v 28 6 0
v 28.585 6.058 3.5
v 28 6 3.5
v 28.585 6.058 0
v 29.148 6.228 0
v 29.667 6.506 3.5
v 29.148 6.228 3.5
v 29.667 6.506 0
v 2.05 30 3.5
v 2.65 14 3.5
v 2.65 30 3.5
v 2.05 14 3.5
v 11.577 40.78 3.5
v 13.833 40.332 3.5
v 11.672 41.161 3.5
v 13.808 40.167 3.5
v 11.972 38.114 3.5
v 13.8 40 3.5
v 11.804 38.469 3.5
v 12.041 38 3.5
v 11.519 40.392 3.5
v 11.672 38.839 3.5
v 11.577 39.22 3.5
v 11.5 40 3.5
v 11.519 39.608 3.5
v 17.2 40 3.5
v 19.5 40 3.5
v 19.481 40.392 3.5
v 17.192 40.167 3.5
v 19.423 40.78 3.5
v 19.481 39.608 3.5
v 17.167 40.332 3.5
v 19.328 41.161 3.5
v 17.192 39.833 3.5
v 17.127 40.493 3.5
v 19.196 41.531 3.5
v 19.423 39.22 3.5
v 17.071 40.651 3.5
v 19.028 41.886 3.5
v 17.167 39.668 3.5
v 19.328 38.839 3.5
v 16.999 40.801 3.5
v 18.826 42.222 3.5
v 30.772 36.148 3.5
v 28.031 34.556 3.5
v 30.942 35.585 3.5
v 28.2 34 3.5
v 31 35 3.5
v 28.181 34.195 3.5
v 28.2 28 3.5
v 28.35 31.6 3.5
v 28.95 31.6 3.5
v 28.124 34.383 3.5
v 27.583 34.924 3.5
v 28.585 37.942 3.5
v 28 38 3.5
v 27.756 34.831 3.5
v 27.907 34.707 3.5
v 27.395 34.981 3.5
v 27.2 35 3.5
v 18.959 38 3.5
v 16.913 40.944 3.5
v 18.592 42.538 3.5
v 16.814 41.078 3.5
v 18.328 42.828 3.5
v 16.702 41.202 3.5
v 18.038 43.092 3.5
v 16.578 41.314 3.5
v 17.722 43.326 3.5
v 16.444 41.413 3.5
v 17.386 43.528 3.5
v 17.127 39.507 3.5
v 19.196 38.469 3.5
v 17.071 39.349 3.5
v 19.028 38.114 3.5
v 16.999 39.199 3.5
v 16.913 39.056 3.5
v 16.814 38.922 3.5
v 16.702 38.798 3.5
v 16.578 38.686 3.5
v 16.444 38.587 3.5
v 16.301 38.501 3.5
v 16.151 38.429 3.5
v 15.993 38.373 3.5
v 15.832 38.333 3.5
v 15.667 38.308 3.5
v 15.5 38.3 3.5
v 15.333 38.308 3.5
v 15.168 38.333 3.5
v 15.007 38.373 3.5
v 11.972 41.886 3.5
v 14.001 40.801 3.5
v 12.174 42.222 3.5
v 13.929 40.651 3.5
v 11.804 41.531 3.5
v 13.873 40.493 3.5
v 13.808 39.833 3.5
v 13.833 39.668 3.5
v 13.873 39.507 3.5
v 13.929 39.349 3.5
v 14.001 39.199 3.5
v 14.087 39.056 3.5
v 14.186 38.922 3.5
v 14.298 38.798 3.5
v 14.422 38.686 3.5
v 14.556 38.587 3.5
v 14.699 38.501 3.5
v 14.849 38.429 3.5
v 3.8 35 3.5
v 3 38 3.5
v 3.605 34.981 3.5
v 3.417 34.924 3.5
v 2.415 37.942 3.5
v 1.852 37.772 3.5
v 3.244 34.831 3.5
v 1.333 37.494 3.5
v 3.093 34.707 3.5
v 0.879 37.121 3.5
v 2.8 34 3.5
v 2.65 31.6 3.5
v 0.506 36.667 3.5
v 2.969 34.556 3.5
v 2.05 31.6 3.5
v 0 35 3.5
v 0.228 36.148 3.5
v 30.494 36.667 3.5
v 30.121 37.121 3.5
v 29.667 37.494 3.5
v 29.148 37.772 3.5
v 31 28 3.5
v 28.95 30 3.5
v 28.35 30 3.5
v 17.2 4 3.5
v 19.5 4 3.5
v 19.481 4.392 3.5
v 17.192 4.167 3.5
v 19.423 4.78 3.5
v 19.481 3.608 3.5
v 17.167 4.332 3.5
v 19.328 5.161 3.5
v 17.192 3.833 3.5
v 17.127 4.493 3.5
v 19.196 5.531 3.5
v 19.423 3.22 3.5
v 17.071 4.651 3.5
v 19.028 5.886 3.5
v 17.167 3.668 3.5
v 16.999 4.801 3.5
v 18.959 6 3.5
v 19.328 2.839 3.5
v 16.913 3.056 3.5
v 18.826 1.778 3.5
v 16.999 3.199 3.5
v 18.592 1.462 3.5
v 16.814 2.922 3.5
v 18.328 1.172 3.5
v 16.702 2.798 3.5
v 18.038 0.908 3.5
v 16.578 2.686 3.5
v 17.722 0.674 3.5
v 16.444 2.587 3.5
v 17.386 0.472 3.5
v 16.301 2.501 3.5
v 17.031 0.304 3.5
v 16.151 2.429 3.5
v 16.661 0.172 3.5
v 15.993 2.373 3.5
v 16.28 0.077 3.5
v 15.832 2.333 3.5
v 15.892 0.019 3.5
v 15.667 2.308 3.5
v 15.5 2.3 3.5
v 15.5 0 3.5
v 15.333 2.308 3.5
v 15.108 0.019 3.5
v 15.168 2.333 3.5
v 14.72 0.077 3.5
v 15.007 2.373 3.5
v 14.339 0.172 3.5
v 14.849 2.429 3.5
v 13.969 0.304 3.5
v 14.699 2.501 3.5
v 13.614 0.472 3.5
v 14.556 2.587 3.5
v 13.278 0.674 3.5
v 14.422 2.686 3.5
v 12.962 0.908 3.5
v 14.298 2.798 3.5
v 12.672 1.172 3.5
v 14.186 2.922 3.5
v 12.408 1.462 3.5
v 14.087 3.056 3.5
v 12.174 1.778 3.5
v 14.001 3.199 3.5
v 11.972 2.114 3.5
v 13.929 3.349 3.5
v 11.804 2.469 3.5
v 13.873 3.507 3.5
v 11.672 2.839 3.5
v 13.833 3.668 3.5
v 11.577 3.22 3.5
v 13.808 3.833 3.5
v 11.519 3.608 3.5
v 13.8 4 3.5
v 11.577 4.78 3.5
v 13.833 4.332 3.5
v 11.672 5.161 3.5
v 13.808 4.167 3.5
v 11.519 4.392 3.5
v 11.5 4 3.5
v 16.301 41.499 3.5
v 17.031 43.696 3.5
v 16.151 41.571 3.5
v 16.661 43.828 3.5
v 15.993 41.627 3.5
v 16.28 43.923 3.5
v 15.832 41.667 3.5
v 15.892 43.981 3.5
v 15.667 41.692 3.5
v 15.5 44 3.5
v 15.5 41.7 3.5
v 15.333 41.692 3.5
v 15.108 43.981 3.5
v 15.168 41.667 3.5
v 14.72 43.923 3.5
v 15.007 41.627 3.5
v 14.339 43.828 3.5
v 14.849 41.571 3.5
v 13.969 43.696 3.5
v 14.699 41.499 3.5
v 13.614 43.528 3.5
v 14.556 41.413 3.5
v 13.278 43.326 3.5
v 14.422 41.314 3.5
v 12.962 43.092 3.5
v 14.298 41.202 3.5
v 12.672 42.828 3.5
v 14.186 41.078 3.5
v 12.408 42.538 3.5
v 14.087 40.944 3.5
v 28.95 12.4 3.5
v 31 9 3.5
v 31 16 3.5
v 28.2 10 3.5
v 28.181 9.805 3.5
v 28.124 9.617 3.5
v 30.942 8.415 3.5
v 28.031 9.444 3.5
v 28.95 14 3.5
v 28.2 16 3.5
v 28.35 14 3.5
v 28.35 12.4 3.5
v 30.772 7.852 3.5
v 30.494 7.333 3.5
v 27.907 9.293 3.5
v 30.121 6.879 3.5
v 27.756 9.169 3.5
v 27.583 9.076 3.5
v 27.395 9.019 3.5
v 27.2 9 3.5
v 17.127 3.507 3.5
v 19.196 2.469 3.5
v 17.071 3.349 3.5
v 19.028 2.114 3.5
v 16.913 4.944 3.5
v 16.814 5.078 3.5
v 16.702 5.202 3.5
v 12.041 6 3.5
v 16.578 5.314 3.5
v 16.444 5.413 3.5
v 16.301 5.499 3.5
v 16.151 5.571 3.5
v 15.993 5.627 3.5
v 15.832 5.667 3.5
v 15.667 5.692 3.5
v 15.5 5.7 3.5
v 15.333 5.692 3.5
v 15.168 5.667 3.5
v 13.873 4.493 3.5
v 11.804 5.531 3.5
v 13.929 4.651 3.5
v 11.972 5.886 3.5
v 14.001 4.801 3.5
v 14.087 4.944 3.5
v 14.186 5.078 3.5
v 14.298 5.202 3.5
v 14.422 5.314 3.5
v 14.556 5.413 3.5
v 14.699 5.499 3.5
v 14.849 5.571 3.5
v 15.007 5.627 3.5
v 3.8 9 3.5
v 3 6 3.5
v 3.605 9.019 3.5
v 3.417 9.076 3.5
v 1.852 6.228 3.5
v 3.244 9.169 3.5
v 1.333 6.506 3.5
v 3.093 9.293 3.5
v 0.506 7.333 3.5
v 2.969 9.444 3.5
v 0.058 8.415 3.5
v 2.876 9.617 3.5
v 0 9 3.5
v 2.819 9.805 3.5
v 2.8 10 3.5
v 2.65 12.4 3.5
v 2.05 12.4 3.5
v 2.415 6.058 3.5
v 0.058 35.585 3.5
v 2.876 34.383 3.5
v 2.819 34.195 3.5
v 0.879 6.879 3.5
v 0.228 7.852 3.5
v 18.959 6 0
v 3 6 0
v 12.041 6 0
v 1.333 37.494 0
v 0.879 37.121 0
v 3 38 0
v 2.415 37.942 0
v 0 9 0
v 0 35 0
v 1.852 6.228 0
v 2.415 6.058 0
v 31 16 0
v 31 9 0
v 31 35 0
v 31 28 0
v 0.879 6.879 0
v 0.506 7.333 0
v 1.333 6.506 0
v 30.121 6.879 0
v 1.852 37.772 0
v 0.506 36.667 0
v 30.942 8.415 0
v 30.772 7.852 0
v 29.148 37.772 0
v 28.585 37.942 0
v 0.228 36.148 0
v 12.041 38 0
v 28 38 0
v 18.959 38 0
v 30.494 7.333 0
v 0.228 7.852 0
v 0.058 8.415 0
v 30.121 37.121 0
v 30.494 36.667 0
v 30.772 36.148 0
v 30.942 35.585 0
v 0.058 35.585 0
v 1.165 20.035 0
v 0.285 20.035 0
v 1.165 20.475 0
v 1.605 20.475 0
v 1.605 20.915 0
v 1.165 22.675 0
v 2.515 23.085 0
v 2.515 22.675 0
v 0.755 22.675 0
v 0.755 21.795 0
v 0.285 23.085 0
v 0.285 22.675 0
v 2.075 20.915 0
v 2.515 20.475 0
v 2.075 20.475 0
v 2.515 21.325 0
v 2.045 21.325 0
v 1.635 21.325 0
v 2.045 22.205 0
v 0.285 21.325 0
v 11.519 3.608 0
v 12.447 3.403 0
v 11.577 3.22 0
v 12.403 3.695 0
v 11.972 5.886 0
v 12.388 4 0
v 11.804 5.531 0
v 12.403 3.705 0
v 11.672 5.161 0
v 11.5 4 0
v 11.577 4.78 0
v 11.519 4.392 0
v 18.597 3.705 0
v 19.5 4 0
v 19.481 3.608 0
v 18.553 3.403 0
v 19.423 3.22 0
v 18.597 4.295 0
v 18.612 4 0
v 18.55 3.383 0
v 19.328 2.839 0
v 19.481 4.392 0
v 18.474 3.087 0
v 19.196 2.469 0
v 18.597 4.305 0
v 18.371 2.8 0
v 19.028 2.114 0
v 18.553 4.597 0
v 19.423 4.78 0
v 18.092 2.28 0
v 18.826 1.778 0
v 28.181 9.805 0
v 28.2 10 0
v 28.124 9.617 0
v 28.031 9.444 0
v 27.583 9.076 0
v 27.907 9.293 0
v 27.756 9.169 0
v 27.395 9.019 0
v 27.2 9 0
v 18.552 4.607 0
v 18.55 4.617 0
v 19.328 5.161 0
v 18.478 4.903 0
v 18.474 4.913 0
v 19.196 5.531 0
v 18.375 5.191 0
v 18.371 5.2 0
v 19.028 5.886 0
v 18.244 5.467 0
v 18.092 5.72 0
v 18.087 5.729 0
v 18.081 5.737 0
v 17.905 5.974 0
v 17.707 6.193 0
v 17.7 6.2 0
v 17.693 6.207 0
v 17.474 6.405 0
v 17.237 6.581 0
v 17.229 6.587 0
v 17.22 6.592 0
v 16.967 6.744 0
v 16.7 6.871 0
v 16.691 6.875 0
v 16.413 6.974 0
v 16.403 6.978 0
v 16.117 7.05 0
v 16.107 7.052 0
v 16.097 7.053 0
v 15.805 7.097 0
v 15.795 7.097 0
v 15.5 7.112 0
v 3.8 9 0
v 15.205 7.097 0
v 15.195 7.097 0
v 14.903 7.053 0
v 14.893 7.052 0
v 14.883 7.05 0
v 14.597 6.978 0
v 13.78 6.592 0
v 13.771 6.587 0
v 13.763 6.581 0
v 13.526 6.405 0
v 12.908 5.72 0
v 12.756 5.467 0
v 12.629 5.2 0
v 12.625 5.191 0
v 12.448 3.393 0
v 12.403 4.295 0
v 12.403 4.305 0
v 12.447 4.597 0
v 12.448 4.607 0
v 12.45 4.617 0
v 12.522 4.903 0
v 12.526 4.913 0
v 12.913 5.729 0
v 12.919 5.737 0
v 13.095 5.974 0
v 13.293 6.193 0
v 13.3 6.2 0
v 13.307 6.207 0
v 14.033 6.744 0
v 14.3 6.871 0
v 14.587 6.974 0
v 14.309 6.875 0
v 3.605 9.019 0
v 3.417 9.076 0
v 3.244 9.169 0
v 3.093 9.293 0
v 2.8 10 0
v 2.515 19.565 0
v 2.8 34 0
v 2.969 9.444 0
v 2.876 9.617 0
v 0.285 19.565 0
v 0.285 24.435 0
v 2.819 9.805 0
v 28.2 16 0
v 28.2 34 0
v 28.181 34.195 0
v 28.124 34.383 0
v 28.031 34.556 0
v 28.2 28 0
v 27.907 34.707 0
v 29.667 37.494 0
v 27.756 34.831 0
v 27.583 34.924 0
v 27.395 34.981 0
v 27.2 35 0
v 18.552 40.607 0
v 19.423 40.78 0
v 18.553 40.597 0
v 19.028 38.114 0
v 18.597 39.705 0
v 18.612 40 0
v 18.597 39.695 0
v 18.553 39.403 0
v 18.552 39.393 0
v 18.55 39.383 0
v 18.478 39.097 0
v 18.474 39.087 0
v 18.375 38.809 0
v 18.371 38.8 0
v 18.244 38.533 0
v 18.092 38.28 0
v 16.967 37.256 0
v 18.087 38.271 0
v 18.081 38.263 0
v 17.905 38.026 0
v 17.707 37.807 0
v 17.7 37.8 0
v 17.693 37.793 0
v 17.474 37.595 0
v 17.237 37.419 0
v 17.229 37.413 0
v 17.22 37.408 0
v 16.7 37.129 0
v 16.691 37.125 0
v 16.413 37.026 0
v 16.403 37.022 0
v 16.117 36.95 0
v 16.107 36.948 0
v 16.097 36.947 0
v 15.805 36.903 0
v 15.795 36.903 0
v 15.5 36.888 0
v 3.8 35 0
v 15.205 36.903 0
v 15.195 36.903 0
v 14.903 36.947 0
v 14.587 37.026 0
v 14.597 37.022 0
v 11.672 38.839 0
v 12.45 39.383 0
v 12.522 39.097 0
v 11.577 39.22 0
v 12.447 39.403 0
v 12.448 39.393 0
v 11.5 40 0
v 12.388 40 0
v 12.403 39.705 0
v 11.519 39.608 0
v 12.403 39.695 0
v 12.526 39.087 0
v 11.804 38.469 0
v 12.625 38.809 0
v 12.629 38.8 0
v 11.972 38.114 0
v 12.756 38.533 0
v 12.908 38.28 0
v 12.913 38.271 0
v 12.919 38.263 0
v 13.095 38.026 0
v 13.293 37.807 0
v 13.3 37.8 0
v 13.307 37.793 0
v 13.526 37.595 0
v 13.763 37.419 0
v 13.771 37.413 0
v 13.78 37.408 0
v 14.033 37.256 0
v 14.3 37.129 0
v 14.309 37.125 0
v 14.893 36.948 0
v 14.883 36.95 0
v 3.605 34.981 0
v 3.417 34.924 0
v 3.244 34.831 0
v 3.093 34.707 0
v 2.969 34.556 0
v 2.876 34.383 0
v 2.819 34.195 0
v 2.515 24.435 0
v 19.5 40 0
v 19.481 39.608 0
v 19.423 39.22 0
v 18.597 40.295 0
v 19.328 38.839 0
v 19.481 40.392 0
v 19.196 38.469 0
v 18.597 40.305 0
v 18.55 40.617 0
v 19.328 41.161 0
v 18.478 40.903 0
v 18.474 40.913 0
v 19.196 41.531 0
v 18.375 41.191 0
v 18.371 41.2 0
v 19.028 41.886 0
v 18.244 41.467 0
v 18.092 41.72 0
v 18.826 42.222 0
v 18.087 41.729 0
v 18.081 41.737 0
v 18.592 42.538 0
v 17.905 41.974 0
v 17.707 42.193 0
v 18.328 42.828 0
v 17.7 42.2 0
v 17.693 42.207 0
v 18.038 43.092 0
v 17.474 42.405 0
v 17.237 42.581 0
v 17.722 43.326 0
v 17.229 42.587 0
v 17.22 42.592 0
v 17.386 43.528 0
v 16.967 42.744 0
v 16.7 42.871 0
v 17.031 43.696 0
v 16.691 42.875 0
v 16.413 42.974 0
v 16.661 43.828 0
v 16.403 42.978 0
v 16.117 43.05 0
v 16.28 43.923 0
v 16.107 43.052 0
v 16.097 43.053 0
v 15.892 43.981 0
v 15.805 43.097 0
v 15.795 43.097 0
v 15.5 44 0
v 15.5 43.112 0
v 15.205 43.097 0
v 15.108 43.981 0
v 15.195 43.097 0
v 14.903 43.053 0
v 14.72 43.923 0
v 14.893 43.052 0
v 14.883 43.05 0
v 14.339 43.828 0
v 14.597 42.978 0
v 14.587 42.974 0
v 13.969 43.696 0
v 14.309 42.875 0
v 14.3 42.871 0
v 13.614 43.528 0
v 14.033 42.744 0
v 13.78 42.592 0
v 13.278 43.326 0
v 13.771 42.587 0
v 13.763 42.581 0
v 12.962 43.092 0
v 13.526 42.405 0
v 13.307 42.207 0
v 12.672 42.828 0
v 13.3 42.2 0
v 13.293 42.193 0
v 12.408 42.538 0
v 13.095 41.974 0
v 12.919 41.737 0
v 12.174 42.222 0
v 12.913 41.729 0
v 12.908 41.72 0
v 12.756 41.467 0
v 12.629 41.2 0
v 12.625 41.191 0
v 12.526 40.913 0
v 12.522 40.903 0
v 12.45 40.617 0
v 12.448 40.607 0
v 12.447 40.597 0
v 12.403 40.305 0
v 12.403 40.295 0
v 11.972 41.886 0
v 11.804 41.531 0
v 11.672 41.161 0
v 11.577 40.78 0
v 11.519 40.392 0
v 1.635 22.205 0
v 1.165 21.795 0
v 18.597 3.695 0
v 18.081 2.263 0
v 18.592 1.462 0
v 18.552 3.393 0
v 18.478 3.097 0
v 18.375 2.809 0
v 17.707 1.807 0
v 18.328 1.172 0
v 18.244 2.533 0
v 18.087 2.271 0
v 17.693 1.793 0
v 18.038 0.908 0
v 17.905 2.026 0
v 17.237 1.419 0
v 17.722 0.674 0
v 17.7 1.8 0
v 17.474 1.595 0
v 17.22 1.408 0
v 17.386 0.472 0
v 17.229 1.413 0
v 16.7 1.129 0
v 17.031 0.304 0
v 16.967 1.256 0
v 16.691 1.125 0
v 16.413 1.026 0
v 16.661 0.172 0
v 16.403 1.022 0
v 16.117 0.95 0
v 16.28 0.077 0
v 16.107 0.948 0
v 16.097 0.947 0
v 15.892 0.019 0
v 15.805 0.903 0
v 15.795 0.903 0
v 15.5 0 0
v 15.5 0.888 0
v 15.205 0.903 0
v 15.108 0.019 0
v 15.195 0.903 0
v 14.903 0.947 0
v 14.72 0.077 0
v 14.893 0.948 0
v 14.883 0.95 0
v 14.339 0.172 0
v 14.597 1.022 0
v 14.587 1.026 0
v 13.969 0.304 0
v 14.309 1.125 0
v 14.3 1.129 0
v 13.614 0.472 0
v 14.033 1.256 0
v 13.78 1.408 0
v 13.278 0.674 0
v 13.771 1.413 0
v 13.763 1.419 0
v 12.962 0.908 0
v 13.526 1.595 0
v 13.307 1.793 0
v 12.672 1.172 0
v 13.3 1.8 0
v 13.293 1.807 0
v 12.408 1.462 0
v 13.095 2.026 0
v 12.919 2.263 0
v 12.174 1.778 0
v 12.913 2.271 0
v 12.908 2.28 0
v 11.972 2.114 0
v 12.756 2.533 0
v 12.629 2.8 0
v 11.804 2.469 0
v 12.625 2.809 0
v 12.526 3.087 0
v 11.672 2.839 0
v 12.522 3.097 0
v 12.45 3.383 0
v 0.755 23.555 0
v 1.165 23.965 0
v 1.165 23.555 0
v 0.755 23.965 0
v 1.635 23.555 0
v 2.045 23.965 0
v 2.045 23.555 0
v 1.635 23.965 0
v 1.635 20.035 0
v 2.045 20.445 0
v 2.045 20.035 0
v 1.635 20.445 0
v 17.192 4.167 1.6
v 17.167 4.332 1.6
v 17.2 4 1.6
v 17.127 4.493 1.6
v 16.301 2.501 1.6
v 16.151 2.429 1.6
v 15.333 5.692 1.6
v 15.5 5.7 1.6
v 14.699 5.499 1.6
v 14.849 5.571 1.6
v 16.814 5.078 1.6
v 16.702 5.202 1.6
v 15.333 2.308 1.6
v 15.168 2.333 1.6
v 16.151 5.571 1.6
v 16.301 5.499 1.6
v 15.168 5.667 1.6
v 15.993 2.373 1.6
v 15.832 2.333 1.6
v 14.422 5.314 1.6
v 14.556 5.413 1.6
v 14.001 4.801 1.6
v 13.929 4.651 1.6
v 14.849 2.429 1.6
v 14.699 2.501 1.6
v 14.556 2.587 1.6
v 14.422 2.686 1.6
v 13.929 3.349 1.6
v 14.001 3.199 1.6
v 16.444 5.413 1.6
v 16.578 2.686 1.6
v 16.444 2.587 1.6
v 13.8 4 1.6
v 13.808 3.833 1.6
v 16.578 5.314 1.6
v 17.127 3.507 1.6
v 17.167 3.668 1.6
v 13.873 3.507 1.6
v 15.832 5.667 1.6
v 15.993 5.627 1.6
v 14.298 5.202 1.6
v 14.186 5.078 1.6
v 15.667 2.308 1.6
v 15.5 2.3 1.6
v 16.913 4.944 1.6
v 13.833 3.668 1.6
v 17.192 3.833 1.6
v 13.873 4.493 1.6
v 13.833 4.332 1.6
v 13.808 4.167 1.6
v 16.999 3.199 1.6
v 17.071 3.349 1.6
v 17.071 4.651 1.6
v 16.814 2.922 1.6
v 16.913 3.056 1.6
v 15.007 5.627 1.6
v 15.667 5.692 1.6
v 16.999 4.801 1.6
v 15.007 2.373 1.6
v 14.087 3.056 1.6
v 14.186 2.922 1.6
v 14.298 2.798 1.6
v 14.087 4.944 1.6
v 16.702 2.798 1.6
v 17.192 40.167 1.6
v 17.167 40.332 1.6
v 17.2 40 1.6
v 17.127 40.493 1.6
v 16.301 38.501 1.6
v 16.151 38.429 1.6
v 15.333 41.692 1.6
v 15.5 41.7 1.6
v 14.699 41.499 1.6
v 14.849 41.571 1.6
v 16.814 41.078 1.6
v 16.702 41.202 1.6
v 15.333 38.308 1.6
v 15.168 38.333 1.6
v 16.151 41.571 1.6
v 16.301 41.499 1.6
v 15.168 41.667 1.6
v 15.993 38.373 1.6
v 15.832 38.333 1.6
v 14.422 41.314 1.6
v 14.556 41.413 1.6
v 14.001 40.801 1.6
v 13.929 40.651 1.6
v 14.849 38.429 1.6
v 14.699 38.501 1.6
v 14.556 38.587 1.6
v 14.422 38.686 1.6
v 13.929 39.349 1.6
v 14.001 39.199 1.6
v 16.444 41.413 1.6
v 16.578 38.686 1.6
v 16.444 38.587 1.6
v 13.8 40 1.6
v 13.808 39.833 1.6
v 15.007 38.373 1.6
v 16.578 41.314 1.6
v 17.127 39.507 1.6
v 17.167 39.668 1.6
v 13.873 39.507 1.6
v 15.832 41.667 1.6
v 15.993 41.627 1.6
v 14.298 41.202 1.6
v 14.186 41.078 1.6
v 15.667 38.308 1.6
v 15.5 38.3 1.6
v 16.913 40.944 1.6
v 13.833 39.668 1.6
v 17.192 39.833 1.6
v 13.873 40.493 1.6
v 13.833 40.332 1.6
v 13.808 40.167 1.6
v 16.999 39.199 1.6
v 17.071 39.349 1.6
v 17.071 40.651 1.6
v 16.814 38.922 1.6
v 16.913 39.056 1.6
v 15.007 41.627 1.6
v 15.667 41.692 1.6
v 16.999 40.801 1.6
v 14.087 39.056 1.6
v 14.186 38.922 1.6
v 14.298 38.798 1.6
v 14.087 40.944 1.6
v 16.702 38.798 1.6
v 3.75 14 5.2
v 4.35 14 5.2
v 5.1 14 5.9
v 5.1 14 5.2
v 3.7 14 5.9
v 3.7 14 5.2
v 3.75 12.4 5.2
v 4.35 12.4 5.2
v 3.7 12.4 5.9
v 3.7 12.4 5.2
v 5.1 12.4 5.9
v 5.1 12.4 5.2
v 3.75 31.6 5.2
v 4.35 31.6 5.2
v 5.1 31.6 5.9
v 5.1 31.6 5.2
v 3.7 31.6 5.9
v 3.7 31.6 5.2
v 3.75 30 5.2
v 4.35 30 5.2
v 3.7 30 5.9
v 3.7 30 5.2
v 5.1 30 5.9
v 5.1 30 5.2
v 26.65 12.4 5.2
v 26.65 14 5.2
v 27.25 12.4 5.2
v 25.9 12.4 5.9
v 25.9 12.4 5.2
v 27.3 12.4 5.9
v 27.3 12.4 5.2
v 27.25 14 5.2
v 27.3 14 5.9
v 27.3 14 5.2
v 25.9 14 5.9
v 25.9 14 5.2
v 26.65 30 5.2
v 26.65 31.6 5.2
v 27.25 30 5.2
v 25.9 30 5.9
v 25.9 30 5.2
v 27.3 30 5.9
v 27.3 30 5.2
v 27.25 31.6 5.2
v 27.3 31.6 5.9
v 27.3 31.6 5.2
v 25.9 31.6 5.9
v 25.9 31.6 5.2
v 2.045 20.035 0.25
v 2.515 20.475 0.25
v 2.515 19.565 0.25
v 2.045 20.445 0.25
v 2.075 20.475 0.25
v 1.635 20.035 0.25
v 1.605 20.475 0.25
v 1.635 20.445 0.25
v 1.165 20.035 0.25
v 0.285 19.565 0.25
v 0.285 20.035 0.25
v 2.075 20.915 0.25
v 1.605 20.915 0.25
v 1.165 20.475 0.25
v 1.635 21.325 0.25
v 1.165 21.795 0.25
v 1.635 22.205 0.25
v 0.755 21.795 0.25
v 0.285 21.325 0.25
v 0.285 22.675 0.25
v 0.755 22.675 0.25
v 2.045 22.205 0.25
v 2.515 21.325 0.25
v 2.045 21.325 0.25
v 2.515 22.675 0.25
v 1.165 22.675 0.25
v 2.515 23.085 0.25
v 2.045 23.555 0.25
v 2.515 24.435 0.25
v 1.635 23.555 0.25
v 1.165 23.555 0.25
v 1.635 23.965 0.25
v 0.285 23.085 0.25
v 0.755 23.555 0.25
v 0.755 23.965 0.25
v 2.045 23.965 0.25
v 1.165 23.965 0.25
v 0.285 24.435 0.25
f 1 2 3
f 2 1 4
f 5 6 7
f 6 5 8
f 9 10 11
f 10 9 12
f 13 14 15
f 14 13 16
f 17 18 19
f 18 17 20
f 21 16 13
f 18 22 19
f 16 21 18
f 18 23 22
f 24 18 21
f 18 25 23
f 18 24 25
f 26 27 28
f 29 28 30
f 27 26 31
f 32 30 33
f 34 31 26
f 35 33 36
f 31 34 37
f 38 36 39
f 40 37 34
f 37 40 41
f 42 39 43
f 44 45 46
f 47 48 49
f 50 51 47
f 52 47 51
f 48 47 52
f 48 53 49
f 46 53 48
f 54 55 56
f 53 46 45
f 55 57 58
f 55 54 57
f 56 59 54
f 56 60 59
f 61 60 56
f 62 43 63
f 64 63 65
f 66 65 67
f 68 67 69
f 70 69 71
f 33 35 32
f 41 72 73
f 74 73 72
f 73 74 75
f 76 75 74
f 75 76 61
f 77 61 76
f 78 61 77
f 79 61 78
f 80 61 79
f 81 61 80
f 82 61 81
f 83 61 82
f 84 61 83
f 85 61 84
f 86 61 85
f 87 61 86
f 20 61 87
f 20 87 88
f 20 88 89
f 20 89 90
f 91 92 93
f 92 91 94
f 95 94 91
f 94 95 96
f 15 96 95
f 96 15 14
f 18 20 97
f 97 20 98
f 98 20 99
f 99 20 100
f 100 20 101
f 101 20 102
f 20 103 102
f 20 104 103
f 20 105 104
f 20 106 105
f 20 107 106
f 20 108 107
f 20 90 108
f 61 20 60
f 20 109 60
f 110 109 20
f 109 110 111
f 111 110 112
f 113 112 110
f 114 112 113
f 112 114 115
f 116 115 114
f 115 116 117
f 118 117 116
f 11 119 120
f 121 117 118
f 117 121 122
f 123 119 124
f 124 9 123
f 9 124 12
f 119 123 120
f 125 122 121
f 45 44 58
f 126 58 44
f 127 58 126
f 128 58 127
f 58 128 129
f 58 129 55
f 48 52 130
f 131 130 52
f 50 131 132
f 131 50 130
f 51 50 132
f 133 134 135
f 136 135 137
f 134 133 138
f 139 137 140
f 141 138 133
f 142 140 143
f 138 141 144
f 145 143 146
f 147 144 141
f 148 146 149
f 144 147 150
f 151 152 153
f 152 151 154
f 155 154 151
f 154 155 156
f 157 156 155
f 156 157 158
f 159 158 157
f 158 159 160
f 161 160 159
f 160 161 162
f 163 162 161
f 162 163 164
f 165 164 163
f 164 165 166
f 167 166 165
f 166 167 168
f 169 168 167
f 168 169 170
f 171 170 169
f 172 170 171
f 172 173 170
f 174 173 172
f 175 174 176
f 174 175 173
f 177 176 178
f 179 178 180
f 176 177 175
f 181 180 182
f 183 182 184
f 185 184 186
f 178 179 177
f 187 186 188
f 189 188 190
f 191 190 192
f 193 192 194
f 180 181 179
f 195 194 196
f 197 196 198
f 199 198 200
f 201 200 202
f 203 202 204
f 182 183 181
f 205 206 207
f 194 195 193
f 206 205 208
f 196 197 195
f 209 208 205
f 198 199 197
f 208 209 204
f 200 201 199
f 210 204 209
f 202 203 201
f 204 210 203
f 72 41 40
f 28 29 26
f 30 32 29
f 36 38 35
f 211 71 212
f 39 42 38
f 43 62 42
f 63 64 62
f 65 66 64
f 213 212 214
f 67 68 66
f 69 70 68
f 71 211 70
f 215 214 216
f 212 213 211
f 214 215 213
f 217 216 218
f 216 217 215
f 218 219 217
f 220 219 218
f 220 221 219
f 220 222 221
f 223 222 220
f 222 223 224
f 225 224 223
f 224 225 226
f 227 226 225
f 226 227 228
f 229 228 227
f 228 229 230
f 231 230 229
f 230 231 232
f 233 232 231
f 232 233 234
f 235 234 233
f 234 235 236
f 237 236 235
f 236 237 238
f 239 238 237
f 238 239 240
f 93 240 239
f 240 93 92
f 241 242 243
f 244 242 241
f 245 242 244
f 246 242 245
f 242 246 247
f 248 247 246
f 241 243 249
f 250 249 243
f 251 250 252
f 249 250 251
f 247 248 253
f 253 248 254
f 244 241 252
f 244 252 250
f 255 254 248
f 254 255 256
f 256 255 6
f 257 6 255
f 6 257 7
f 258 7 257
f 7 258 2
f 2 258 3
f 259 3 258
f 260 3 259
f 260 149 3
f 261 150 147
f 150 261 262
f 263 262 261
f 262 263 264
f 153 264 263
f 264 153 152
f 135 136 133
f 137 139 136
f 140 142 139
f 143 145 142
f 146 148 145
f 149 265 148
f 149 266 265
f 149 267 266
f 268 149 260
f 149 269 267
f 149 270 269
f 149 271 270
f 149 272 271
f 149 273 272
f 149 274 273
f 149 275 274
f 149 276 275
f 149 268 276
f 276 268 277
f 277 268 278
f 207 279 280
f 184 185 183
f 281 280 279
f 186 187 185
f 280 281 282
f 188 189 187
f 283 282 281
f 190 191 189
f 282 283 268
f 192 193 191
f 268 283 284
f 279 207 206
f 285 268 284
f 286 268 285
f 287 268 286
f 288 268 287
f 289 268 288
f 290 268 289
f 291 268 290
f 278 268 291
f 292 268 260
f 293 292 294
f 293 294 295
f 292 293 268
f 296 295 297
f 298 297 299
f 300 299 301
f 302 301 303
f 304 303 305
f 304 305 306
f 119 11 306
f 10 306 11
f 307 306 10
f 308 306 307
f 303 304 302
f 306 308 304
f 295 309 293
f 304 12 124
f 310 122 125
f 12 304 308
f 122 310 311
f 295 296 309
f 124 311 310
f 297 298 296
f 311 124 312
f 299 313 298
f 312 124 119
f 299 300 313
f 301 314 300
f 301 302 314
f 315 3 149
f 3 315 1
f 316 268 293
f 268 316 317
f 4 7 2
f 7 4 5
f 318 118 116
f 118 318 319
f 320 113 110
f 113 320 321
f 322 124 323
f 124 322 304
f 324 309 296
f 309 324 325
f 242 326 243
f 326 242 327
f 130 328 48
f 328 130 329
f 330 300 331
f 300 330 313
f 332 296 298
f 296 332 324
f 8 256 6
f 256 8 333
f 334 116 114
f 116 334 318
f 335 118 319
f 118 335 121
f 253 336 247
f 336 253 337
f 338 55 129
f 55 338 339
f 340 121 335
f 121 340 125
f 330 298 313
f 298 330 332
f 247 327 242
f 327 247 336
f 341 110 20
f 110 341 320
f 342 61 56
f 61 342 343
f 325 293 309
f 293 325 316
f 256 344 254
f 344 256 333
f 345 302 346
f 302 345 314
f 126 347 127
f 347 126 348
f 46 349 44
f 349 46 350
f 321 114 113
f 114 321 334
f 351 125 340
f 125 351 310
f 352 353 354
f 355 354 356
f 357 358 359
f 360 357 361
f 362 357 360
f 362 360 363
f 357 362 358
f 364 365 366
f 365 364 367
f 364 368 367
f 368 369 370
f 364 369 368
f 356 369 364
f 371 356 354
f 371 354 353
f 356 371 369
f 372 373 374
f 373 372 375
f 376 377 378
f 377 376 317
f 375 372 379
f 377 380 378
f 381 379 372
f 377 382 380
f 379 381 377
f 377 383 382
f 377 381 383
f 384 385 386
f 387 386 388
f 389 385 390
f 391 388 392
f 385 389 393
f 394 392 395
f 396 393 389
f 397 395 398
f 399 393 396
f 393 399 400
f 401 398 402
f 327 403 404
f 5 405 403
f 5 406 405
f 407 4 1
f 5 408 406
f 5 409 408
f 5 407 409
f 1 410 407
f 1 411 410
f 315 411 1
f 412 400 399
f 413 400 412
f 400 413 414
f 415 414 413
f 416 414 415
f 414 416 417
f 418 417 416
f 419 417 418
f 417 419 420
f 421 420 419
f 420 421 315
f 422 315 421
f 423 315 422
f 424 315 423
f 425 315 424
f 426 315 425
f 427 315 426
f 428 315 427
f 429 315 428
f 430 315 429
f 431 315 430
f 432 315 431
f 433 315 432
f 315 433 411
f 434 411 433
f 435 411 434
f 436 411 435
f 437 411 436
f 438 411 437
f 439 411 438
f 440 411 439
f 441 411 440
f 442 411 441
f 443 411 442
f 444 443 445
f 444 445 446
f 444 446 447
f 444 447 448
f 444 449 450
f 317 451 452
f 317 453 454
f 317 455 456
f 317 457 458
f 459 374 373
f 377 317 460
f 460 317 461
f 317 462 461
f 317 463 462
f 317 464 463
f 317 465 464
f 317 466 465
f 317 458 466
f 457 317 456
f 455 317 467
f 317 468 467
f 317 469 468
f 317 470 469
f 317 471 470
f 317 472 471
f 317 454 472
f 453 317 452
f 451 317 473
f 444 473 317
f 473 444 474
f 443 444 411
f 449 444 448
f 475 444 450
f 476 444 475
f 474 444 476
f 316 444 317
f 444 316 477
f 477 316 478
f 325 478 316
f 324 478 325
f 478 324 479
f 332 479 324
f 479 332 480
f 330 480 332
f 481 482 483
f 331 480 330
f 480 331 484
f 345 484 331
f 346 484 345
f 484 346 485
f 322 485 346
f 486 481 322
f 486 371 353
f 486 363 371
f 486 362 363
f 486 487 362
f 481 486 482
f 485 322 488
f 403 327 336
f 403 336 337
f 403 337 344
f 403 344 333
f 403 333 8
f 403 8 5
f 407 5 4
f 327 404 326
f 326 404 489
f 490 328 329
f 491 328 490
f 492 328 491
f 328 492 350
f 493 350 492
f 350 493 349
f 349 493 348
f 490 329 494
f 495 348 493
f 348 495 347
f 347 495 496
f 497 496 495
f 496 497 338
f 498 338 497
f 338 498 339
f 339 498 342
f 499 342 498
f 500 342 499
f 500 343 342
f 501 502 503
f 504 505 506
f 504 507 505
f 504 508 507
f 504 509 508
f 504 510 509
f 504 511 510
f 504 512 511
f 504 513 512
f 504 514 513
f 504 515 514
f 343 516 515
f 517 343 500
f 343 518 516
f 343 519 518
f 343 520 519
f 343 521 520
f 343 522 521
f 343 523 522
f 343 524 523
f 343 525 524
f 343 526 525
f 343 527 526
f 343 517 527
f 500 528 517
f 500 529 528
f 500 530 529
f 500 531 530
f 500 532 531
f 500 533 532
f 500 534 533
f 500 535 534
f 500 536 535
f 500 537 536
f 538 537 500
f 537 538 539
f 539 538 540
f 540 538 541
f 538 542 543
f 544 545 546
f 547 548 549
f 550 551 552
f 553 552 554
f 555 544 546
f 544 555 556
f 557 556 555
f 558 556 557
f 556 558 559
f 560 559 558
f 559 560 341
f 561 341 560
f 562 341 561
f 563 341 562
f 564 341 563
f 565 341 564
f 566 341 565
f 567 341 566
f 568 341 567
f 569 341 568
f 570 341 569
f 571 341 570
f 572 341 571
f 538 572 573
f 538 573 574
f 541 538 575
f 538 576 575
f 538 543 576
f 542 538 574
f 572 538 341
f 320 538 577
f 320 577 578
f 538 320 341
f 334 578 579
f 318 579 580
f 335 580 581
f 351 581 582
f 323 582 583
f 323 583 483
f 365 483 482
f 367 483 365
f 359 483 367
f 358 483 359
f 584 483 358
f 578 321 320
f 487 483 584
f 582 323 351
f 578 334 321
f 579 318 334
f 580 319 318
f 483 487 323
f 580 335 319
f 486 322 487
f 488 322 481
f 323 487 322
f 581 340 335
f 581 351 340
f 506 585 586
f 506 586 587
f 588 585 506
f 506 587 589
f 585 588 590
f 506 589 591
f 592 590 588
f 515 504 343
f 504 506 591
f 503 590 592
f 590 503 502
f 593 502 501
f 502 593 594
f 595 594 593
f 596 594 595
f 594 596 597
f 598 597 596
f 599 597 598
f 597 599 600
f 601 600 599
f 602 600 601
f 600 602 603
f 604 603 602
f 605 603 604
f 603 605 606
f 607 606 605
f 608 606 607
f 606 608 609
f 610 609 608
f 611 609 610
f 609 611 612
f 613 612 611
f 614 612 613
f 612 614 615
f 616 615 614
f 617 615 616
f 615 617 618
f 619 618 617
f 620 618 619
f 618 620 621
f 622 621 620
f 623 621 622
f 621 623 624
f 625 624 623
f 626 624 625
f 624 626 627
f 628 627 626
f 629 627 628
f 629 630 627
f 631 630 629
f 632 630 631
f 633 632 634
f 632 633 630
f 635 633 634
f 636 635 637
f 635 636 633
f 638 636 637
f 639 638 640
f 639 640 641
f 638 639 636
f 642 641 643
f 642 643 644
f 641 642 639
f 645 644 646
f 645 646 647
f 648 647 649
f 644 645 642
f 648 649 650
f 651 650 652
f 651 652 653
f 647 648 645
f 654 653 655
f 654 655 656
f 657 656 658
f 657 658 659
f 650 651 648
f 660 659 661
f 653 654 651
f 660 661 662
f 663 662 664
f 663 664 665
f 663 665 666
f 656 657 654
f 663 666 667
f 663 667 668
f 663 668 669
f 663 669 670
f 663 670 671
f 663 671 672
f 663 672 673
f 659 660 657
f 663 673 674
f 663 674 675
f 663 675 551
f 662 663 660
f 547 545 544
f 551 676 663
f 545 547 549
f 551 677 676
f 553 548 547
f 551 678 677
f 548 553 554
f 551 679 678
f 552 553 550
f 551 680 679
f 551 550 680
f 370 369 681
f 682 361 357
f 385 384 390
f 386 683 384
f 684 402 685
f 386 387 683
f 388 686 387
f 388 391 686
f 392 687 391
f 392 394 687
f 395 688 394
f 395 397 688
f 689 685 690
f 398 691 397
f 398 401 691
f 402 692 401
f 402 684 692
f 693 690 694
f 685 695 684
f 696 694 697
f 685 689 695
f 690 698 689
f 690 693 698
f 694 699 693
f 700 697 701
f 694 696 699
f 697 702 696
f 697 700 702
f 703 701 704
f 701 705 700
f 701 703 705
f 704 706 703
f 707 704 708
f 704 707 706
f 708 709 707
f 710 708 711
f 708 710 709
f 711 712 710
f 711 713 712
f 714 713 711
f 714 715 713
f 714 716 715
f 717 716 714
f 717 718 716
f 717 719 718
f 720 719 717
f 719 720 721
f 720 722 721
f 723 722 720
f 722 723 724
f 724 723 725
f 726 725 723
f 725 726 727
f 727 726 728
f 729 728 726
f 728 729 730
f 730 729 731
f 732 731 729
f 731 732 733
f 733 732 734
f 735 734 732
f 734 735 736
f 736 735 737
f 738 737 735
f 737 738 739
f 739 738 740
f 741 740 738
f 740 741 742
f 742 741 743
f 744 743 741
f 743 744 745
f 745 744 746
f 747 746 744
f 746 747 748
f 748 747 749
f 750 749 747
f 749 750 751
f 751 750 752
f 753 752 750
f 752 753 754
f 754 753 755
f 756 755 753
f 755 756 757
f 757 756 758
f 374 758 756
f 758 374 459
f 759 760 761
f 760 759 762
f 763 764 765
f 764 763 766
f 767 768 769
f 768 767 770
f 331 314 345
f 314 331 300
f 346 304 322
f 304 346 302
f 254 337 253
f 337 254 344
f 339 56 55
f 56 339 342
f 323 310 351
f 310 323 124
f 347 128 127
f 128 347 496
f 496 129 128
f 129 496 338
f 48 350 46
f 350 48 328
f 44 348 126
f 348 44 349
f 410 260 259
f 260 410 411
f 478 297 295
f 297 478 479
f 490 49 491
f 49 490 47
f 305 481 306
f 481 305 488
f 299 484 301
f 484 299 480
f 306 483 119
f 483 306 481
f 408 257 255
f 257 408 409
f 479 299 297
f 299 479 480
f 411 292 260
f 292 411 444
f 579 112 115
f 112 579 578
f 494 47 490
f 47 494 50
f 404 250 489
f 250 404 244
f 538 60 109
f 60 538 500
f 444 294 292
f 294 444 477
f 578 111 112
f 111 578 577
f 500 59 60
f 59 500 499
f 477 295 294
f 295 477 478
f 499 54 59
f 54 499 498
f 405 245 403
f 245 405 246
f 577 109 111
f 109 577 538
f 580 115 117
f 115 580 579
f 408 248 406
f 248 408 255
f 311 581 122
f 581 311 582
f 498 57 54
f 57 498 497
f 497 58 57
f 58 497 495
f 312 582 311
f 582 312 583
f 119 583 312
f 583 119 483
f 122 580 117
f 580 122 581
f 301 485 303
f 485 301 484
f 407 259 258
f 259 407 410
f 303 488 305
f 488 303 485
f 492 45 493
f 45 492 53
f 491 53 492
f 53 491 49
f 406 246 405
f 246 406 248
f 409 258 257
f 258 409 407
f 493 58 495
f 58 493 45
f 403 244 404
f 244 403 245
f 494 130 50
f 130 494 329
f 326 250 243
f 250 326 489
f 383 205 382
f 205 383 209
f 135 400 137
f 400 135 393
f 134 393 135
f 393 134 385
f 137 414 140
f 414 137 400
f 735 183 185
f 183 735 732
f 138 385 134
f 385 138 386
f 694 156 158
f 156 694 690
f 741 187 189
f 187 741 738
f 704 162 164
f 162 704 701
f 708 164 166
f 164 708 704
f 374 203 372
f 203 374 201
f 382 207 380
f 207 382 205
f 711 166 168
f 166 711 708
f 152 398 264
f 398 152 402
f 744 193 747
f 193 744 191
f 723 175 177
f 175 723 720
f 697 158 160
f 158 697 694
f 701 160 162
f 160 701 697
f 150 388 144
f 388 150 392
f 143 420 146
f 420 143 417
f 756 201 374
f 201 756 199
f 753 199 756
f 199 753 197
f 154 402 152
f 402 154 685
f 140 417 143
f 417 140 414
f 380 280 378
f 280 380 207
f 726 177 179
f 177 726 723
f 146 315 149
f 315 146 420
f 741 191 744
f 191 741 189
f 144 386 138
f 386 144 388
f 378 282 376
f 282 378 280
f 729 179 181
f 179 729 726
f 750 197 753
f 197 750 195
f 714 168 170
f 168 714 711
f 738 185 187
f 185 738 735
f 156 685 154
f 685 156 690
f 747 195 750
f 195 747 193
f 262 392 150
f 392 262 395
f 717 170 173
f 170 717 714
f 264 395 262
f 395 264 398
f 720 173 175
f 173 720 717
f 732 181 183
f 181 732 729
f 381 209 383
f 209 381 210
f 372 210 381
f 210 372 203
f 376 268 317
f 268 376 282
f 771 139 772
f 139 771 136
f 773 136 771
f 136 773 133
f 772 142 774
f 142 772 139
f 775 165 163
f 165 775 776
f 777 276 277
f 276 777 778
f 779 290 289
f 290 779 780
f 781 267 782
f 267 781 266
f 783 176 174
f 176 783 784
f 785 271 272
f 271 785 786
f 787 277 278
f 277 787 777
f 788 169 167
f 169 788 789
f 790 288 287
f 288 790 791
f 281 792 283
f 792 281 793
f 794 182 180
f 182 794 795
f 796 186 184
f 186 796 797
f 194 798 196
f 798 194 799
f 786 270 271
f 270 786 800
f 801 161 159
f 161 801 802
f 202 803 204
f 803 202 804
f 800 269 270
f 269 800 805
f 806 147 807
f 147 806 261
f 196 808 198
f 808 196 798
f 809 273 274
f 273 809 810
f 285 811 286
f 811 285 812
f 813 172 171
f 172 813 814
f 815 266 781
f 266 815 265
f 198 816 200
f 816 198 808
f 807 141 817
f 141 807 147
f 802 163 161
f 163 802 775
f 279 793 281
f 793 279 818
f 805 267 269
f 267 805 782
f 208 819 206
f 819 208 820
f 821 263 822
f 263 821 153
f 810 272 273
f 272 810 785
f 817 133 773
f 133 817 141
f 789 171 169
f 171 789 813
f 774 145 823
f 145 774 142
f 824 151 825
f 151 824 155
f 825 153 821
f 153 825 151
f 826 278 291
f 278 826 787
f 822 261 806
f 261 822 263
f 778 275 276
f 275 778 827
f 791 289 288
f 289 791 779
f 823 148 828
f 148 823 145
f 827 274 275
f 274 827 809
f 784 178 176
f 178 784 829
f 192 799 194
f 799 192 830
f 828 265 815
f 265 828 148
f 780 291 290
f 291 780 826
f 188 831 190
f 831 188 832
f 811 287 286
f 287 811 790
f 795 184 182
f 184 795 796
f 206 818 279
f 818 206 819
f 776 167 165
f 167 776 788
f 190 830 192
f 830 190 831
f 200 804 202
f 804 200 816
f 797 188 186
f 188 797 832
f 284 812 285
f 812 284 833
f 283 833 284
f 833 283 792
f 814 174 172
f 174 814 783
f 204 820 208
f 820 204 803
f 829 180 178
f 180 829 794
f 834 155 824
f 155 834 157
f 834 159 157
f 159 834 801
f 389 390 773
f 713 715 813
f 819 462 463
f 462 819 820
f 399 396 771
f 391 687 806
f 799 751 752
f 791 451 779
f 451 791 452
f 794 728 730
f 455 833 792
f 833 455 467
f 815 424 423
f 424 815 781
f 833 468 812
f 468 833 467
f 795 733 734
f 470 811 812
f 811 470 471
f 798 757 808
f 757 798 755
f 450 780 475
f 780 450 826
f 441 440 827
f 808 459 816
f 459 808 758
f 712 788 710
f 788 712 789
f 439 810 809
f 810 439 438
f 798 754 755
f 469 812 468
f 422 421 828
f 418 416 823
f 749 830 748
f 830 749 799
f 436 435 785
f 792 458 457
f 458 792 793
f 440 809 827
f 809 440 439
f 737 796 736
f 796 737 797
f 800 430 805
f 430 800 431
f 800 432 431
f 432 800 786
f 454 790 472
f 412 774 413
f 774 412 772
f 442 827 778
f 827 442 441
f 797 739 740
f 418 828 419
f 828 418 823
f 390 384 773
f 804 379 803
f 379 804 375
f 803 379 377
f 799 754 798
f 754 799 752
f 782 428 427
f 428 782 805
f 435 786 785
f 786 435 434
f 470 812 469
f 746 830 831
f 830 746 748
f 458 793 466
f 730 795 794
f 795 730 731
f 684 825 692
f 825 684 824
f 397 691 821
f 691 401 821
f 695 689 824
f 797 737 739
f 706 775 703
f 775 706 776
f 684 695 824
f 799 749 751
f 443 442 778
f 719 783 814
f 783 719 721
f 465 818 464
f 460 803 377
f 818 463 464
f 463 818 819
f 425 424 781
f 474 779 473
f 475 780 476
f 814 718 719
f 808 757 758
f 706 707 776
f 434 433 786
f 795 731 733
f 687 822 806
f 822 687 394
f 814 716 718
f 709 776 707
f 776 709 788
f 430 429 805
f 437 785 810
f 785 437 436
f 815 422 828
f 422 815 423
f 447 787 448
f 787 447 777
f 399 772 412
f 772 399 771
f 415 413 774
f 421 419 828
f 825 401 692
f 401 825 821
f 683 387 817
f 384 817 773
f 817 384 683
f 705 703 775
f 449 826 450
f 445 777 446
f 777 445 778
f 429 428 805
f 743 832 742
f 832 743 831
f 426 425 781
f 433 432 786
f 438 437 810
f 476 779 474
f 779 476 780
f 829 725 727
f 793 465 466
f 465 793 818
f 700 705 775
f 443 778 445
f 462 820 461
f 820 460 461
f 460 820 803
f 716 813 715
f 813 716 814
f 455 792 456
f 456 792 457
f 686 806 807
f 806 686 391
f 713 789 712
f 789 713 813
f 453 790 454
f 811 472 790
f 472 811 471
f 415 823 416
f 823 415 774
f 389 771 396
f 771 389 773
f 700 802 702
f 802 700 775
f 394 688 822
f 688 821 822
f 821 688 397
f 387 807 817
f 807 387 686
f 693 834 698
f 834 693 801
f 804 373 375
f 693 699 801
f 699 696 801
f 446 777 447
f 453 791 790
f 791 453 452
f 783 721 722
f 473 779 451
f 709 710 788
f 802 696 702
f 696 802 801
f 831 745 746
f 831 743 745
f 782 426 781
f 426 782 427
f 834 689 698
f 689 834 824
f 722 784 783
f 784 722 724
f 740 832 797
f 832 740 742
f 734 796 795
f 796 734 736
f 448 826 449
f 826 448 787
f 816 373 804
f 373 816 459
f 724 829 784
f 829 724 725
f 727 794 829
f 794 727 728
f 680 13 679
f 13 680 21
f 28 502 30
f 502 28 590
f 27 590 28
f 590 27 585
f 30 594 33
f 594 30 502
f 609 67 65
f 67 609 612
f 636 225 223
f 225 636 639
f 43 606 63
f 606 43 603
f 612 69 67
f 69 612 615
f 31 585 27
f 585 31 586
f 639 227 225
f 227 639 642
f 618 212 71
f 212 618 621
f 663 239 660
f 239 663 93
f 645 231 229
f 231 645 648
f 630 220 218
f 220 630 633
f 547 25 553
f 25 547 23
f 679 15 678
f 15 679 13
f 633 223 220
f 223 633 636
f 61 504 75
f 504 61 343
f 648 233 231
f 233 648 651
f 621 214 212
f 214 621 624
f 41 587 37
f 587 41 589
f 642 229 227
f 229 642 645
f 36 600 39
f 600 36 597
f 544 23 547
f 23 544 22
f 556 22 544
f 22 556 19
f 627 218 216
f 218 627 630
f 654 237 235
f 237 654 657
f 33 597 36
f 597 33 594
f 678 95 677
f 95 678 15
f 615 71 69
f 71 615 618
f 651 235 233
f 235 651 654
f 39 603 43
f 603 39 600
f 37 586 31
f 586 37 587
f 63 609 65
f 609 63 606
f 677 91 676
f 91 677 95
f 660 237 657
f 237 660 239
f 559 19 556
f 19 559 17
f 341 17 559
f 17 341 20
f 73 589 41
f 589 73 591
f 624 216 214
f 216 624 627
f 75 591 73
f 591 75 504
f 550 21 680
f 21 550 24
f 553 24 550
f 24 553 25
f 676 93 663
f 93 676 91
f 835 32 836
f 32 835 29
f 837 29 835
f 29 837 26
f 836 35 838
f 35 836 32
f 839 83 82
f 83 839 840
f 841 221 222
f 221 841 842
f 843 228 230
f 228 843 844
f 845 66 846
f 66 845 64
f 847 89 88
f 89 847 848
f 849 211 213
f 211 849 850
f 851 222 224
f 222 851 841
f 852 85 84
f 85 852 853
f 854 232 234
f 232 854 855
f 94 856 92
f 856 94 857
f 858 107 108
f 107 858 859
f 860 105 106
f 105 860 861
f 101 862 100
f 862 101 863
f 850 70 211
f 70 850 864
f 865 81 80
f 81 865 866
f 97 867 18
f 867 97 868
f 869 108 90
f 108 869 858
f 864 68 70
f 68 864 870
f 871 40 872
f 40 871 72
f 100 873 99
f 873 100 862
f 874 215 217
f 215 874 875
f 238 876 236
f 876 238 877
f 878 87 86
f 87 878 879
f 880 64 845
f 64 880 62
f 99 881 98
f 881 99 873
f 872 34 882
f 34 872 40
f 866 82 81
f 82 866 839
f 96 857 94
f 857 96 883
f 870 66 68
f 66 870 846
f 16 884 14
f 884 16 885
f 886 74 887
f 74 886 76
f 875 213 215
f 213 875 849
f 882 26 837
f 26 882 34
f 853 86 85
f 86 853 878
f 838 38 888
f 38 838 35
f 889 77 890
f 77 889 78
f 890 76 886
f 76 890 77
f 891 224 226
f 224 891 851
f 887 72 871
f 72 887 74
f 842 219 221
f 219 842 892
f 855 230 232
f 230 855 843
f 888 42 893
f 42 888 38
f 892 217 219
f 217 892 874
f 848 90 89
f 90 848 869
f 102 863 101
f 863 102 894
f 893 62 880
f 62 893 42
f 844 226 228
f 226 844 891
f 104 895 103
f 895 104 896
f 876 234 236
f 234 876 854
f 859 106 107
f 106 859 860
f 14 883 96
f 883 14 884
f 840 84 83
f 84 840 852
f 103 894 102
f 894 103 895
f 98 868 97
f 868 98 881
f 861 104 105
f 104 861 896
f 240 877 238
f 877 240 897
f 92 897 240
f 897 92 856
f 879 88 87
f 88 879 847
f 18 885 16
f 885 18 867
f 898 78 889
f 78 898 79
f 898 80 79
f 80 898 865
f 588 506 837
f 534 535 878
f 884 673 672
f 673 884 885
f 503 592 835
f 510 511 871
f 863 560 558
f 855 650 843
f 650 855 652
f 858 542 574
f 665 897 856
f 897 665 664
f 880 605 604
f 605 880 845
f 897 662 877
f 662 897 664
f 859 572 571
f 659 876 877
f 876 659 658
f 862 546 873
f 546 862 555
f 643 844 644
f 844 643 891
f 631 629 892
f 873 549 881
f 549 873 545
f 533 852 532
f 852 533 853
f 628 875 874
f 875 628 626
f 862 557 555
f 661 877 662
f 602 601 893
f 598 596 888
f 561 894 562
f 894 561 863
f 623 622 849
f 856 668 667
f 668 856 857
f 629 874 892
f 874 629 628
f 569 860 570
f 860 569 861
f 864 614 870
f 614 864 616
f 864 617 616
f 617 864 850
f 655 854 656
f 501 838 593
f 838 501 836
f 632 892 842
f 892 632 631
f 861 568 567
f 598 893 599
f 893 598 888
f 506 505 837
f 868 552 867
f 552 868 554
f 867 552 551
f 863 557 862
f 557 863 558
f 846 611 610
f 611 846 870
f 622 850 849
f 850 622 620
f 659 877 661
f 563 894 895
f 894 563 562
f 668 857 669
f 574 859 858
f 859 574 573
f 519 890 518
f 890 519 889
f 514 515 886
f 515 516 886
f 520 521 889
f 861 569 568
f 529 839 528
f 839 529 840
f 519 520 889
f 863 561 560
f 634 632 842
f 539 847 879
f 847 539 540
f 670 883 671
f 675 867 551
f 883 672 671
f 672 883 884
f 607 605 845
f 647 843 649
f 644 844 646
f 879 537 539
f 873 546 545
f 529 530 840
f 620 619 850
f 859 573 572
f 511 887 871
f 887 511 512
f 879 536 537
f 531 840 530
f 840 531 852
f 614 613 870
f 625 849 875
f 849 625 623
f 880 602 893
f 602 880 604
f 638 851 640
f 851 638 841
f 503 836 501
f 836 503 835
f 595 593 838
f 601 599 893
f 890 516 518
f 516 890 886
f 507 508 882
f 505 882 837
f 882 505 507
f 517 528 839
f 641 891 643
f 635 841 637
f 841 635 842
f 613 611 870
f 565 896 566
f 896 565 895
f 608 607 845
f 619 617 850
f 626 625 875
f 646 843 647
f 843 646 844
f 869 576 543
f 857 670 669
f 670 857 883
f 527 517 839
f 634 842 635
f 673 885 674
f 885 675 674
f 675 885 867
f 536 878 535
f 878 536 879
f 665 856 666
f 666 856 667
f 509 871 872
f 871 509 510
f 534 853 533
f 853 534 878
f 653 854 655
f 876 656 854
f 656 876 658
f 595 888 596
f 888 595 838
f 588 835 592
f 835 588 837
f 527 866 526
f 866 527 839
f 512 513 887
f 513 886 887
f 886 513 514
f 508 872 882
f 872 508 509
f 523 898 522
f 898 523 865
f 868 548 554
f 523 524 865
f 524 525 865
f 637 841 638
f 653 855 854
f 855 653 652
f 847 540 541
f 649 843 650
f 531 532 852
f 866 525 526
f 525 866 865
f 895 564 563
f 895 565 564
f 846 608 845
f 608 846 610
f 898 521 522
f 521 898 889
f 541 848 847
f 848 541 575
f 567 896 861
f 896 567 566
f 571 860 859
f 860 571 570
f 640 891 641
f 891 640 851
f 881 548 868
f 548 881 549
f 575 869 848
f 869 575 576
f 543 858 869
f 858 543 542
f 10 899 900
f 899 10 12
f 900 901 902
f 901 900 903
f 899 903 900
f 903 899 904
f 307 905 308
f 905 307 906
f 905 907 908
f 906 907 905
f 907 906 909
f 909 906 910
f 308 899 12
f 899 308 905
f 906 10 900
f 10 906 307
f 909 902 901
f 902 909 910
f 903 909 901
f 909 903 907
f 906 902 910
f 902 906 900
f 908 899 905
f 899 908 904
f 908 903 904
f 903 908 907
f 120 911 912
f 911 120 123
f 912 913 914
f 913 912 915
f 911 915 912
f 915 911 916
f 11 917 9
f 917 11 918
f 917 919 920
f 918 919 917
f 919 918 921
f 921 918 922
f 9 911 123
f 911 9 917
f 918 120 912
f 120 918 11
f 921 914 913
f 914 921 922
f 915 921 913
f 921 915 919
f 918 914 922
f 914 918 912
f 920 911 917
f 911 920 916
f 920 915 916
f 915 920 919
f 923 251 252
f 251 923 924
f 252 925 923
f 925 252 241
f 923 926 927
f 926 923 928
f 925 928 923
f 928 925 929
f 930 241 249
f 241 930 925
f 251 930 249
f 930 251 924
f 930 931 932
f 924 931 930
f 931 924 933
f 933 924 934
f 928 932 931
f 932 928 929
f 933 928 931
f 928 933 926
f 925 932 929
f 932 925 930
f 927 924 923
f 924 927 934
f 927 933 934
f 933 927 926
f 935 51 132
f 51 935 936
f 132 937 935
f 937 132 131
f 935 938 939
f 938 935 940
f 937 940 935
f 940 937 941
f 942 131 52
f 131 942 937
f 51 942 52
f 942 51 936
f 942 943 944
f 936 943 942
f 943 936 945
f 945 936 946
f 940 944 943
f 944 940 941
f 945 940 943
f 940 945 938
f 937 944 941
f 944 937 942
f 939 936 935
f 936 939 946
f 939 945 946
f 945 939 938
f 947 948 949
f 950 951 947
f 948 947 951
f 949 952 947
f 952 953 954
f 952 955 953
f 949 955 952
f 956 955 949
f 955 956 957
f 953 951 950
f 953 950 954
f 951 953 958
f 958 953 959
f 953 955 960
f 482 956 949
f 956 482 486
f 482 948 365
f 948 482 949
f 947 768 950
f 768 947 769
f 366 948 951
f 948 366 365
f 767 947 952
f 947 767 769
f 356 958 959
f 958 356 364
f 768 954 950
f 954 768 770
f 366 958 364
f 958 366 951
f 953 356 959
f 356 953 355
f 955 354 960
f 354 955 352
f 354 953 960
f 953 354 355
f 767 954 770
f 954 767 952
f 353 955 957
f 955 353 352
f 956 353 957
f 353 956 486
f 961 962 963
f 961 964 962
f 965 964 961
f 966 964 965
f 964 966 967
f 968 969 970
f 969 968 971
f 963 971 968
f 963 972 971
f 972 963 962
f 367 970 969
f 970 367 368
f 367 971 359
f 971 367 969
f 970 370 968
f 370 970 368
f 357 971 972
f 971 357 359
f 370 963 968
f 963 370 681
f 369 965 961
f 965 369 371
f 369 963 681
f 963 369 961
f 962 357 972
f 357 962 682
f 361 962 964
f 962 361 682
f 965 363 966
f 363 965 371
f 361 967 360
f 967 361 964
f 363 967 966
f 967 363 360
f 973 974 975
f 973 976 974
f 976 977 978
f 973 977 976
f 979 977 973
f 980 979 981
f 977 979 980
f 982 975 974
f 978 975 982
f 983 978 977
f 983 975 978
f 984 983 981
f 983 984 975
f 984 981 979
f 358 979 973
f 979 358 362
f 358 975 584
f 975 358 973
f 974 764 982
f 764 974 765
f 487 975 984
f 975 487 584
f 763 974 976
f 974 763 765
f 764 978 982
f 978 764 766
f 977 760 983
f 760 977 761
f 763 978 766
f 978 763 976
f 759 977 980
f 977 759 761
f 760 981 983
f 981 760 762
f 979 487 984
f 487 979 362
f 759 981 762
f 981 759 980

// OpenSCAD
// 90度固定式OLED邊緣彈性壓板
$fn=64;
translate([-59.5,46,-119.5]){rotate([0,0,0]){difference(){union(){union(){union(){union(){difference(){difference(){union(){difference(){difference(){union(){difference(){difference(){translate([75,-24,0]){translate([0,0,119.5]){linear_extrude(height=3.5)polygon([[15.5,13],[15.44236,13.58527],[15.27164,14.14805],[14.99441,14.66671],[14.62132,15.12132],[14.16671,15.49441],[13.64805,15.77164],[13.08527,15.94236],[12.5,16],[-12.5,16],[-13.08527,15.94236],[-13.64805,15.77164],[-14.16671,15.49441],[-14.62132,15.12132],[-14.99441,14.66671],[-15.27164,14.14805],[-15.44236,13.58527],[-15.5,13],[-15.5,-13],[-15.44236,-13.58527],[-15.27164,-14.14805],[-14.99441,-14.66671],[-14.62132,-15.12132],[-14.16671,-15.49441],[-13.64805,-15.77164],[-13.08527,-15.94236],[-12.5,-16],[12.5,-16],[13.08527,-15.94236],[13.64805,-15.77164],[14.16671,-15.49441],[14.62132,-15.12132],[14.99441,-14.66671],[15.27164,-14.14805],[15.44236,-13.58527],[15.5,-13]]);}}translate([75,-24,0]){translate([0,0,119.3]){linear_extrude(height=5)polygon([[12.7,12],[12.68079,12.19509],[12.62388,12.38268],[12.53147,12.55557],[12.40711,12.70711],[12.25557,12.83147],[12.08268,12.92388],[11.89509,12.98079],[11.7,13],[-11.7,13],[-11.89509,12.98079],[-12.08268,12.92388],[-12.25557,12.83147],[-12.40711,12.70711],[-12.53147,12.55557],[-12.62388,12.38268],[-12.68079,12.19509],[-12.7,12],[-12.7,-12],[-12.68079,-12.19509],[-12.62388,-12.38268],[-12.53147,-12.55557],[-12.40711,-12.70711],[-12.25557,-12.83147],[-12.08268,-12.92388],[-11.89509,-12.98079],[-11.7,-13],[11.7,-13],[11.89509,-12.98079],[12.08268,-12.92388],[12.25557,-12.83147],[12.40711,-12.70711],[12.53147,-12.55557],[12.62388,-12.38268],[12.68079,-12.19509],[12.7,-12]]);}}}translate([85.2,-30,119.3]){cube([8,12,5]);}}translate([75,-42,119.5]){cylinder(h=3.5,d1=8,d2=8,$fn=64);}}translate([75,-42,119.3]){cylinder(h=4,d1=3.4,d2=3.4,$fn=64);}}translate([75,-42,119.4]){cylinder(h=1.7,d1=6.4,d2=3.4,$fn=64);}}translate([75,-6,119.5]){cylinder(h=3.5,d1=8,d2=8,$fn=64);}}translate([75,-6,119.3]){cylinder(h=4,d1=3.4,d2=3.4,$fn=64);}}translate([75,-6,119.4]){cylinder(h=1.7,d1=6.4,d2=3.4,$fn=64);}}union(){multmatrix([[1,0,0,0],[0,0,-1,-32],[0,1,0,0],[0,0,0,1]]){translate([0,0,0]){linear_extrude(height=1.6)polygon([[63.9,124.75],[63.9,125.35],[61.5,122.95],[61.5,122.35]]);}}translate([63.2,-33.6,124.7]){cube([1.4,1.6,0.7]);}}}union(){multmatrix([[1,0,0,0],[0,0,-1,-14.4],[0,1,0,0],[0,0,0,1]]){translate([0,0,0]){linear_extrude(height=1.6)polygon([[63.9,124.75],[63.9,125.35],[61.5,122.95],[61.5,122.35]]);}}translate([63.2,-16,124.7]){cube([1.4,1.6,0.7]);}}}union(){multmatrix([[1,0,0,0],[0,0,-1,-32],[0,1,0,0],[0,0,0,1]]){translate([0,0,0]){linear_extrude(height=1.6)polygon([[88.5,122.35],[88.5,122.95],[86.1,125.35],[86.1,124.75]]);}}translate([85.4,-33.6,124.7]){cube([1.4,1.6,0.7]);}}}union(){multmatrix([[1,0,0,0],[0,0,-1,-14.4],[0,1,0,0],[0,0,0,1]]){translate([0,0,0]){linear_extrude(height=1.6)polygon([[88.5,122.35],[88.5,122.95],[86.1,125.35],[86.1,124.75]]);}}translate([85.4,-16,124.7]){cube([1.4,1.6,0.7]);}}}multmatrix([[0,1,0,60.9],[1,0,0,-24],[0,0,-1,119.5],[0,0,0,1]]){union(){union(){union(){union(){union(){union(){union(){union(){union(){union(){union(){union(){union(){union(){union(){union(){union(){union(){union(){union(){union(){union(){union(){union(){union(){union(){union(){union(){union(){union(){union(){translate([-2.435,0.645,-0.25]){cube([0.47,0.47,0.37]);}translate([-1.995,0.645,-0.25]){cube([0.47,0.47,0.37]);}}translate([-2.435,0.205,-0.25]){cube([0.47,0.47,0.37]);}}translate([-1.555,0.205,-0.25]){cube([0.47,0.47,0.37]);}}translate([-2.435,-0.235,-0.25]){cube([0.47,0.47,0.37]);}}translate([-1.995,-0.235,-0.25]){cube([0.47,0.47,0.37]);}}translate([-2.435,-0.675,-0.25]){cube([0.47,0.47,0.37]);}}translate([-2.435,-1.115,-0.25]){cube([0.47,0.47,0.37]);}}translate([-0.675,0.645,-0.25]){cube([0.47,0.47,0.37]);}}translate([-0.235,0.645,-0.25]){cube([0.47,0.47,0.37]);}}translate([0.205,0.645,-0.25]){cube([0.47,0.47,0.37]);}}translate([0.205,0.205,-0.25]){cube([0.47,0.47,0.37]);}}translate([-0.675,-0.235,-0.25]){cube([0.47,0.47,0.37]);}}translate([-0.235,-0.235,-0.25]){cube([0.47,0.47,0.37]);}}translate([0.205,-0.235,-0.25]){cube([0.47,0.47,0.37]);}}translate([-0.675,-0.675,-0.25]){cube([0.47,0.47,0.37]);}}translate([-0.675,-1.115,-0.25]){cube([0.47,0.47,0.37]);}}translate([-0.235,-1.115,-0.25]){cube([0.47,0.47,0.37]);}}translate([0.205,-1.115,-0.25]){cube([0.47,0.47,0.37]);}}translate([1.085,0.645,-0.25]){cube([0.47,0.47,0.37]);}}translate([1.525,0.645,-0.25]){cube([0.47,0.47,0.37]);}}translate([1.965,0.645,-0.25]){cube([0.47,0.47,0.37]);}}translate([1.085,0.205,-0.25]){cube([0.47,0.47,0.37]);}}translate([1.965,0.205,-0.25]){cube([0.47,0.47,0.37]);}}translate([1.085,-0.235,-0.25]){cube([0.47,0.47,0.37]);}}translate([1.525,-0.235,-0.25]){cube([0.47,0.47,0.37]);}}translate([1.965,-0.235,-0.25]){cube([0.47,0.47,0.37]);}}translate([1.085,-0.675,-0.25]){cube([0.47,0.47,0.37]);}}translate([1.965,-0.675,-0.25]){cube([0.47,0.47,0.37]);}}translate([1.085,-1.115,-0.25]){cube([0.47,0.47,0.37]);}}translate([1.525,-1.115,-0.25]){cube([0.47,0.47,0.37]);}}translate([1.965,-1.115,-0.25]){cube([0.47,0.47,0.37]);}}}}}}
